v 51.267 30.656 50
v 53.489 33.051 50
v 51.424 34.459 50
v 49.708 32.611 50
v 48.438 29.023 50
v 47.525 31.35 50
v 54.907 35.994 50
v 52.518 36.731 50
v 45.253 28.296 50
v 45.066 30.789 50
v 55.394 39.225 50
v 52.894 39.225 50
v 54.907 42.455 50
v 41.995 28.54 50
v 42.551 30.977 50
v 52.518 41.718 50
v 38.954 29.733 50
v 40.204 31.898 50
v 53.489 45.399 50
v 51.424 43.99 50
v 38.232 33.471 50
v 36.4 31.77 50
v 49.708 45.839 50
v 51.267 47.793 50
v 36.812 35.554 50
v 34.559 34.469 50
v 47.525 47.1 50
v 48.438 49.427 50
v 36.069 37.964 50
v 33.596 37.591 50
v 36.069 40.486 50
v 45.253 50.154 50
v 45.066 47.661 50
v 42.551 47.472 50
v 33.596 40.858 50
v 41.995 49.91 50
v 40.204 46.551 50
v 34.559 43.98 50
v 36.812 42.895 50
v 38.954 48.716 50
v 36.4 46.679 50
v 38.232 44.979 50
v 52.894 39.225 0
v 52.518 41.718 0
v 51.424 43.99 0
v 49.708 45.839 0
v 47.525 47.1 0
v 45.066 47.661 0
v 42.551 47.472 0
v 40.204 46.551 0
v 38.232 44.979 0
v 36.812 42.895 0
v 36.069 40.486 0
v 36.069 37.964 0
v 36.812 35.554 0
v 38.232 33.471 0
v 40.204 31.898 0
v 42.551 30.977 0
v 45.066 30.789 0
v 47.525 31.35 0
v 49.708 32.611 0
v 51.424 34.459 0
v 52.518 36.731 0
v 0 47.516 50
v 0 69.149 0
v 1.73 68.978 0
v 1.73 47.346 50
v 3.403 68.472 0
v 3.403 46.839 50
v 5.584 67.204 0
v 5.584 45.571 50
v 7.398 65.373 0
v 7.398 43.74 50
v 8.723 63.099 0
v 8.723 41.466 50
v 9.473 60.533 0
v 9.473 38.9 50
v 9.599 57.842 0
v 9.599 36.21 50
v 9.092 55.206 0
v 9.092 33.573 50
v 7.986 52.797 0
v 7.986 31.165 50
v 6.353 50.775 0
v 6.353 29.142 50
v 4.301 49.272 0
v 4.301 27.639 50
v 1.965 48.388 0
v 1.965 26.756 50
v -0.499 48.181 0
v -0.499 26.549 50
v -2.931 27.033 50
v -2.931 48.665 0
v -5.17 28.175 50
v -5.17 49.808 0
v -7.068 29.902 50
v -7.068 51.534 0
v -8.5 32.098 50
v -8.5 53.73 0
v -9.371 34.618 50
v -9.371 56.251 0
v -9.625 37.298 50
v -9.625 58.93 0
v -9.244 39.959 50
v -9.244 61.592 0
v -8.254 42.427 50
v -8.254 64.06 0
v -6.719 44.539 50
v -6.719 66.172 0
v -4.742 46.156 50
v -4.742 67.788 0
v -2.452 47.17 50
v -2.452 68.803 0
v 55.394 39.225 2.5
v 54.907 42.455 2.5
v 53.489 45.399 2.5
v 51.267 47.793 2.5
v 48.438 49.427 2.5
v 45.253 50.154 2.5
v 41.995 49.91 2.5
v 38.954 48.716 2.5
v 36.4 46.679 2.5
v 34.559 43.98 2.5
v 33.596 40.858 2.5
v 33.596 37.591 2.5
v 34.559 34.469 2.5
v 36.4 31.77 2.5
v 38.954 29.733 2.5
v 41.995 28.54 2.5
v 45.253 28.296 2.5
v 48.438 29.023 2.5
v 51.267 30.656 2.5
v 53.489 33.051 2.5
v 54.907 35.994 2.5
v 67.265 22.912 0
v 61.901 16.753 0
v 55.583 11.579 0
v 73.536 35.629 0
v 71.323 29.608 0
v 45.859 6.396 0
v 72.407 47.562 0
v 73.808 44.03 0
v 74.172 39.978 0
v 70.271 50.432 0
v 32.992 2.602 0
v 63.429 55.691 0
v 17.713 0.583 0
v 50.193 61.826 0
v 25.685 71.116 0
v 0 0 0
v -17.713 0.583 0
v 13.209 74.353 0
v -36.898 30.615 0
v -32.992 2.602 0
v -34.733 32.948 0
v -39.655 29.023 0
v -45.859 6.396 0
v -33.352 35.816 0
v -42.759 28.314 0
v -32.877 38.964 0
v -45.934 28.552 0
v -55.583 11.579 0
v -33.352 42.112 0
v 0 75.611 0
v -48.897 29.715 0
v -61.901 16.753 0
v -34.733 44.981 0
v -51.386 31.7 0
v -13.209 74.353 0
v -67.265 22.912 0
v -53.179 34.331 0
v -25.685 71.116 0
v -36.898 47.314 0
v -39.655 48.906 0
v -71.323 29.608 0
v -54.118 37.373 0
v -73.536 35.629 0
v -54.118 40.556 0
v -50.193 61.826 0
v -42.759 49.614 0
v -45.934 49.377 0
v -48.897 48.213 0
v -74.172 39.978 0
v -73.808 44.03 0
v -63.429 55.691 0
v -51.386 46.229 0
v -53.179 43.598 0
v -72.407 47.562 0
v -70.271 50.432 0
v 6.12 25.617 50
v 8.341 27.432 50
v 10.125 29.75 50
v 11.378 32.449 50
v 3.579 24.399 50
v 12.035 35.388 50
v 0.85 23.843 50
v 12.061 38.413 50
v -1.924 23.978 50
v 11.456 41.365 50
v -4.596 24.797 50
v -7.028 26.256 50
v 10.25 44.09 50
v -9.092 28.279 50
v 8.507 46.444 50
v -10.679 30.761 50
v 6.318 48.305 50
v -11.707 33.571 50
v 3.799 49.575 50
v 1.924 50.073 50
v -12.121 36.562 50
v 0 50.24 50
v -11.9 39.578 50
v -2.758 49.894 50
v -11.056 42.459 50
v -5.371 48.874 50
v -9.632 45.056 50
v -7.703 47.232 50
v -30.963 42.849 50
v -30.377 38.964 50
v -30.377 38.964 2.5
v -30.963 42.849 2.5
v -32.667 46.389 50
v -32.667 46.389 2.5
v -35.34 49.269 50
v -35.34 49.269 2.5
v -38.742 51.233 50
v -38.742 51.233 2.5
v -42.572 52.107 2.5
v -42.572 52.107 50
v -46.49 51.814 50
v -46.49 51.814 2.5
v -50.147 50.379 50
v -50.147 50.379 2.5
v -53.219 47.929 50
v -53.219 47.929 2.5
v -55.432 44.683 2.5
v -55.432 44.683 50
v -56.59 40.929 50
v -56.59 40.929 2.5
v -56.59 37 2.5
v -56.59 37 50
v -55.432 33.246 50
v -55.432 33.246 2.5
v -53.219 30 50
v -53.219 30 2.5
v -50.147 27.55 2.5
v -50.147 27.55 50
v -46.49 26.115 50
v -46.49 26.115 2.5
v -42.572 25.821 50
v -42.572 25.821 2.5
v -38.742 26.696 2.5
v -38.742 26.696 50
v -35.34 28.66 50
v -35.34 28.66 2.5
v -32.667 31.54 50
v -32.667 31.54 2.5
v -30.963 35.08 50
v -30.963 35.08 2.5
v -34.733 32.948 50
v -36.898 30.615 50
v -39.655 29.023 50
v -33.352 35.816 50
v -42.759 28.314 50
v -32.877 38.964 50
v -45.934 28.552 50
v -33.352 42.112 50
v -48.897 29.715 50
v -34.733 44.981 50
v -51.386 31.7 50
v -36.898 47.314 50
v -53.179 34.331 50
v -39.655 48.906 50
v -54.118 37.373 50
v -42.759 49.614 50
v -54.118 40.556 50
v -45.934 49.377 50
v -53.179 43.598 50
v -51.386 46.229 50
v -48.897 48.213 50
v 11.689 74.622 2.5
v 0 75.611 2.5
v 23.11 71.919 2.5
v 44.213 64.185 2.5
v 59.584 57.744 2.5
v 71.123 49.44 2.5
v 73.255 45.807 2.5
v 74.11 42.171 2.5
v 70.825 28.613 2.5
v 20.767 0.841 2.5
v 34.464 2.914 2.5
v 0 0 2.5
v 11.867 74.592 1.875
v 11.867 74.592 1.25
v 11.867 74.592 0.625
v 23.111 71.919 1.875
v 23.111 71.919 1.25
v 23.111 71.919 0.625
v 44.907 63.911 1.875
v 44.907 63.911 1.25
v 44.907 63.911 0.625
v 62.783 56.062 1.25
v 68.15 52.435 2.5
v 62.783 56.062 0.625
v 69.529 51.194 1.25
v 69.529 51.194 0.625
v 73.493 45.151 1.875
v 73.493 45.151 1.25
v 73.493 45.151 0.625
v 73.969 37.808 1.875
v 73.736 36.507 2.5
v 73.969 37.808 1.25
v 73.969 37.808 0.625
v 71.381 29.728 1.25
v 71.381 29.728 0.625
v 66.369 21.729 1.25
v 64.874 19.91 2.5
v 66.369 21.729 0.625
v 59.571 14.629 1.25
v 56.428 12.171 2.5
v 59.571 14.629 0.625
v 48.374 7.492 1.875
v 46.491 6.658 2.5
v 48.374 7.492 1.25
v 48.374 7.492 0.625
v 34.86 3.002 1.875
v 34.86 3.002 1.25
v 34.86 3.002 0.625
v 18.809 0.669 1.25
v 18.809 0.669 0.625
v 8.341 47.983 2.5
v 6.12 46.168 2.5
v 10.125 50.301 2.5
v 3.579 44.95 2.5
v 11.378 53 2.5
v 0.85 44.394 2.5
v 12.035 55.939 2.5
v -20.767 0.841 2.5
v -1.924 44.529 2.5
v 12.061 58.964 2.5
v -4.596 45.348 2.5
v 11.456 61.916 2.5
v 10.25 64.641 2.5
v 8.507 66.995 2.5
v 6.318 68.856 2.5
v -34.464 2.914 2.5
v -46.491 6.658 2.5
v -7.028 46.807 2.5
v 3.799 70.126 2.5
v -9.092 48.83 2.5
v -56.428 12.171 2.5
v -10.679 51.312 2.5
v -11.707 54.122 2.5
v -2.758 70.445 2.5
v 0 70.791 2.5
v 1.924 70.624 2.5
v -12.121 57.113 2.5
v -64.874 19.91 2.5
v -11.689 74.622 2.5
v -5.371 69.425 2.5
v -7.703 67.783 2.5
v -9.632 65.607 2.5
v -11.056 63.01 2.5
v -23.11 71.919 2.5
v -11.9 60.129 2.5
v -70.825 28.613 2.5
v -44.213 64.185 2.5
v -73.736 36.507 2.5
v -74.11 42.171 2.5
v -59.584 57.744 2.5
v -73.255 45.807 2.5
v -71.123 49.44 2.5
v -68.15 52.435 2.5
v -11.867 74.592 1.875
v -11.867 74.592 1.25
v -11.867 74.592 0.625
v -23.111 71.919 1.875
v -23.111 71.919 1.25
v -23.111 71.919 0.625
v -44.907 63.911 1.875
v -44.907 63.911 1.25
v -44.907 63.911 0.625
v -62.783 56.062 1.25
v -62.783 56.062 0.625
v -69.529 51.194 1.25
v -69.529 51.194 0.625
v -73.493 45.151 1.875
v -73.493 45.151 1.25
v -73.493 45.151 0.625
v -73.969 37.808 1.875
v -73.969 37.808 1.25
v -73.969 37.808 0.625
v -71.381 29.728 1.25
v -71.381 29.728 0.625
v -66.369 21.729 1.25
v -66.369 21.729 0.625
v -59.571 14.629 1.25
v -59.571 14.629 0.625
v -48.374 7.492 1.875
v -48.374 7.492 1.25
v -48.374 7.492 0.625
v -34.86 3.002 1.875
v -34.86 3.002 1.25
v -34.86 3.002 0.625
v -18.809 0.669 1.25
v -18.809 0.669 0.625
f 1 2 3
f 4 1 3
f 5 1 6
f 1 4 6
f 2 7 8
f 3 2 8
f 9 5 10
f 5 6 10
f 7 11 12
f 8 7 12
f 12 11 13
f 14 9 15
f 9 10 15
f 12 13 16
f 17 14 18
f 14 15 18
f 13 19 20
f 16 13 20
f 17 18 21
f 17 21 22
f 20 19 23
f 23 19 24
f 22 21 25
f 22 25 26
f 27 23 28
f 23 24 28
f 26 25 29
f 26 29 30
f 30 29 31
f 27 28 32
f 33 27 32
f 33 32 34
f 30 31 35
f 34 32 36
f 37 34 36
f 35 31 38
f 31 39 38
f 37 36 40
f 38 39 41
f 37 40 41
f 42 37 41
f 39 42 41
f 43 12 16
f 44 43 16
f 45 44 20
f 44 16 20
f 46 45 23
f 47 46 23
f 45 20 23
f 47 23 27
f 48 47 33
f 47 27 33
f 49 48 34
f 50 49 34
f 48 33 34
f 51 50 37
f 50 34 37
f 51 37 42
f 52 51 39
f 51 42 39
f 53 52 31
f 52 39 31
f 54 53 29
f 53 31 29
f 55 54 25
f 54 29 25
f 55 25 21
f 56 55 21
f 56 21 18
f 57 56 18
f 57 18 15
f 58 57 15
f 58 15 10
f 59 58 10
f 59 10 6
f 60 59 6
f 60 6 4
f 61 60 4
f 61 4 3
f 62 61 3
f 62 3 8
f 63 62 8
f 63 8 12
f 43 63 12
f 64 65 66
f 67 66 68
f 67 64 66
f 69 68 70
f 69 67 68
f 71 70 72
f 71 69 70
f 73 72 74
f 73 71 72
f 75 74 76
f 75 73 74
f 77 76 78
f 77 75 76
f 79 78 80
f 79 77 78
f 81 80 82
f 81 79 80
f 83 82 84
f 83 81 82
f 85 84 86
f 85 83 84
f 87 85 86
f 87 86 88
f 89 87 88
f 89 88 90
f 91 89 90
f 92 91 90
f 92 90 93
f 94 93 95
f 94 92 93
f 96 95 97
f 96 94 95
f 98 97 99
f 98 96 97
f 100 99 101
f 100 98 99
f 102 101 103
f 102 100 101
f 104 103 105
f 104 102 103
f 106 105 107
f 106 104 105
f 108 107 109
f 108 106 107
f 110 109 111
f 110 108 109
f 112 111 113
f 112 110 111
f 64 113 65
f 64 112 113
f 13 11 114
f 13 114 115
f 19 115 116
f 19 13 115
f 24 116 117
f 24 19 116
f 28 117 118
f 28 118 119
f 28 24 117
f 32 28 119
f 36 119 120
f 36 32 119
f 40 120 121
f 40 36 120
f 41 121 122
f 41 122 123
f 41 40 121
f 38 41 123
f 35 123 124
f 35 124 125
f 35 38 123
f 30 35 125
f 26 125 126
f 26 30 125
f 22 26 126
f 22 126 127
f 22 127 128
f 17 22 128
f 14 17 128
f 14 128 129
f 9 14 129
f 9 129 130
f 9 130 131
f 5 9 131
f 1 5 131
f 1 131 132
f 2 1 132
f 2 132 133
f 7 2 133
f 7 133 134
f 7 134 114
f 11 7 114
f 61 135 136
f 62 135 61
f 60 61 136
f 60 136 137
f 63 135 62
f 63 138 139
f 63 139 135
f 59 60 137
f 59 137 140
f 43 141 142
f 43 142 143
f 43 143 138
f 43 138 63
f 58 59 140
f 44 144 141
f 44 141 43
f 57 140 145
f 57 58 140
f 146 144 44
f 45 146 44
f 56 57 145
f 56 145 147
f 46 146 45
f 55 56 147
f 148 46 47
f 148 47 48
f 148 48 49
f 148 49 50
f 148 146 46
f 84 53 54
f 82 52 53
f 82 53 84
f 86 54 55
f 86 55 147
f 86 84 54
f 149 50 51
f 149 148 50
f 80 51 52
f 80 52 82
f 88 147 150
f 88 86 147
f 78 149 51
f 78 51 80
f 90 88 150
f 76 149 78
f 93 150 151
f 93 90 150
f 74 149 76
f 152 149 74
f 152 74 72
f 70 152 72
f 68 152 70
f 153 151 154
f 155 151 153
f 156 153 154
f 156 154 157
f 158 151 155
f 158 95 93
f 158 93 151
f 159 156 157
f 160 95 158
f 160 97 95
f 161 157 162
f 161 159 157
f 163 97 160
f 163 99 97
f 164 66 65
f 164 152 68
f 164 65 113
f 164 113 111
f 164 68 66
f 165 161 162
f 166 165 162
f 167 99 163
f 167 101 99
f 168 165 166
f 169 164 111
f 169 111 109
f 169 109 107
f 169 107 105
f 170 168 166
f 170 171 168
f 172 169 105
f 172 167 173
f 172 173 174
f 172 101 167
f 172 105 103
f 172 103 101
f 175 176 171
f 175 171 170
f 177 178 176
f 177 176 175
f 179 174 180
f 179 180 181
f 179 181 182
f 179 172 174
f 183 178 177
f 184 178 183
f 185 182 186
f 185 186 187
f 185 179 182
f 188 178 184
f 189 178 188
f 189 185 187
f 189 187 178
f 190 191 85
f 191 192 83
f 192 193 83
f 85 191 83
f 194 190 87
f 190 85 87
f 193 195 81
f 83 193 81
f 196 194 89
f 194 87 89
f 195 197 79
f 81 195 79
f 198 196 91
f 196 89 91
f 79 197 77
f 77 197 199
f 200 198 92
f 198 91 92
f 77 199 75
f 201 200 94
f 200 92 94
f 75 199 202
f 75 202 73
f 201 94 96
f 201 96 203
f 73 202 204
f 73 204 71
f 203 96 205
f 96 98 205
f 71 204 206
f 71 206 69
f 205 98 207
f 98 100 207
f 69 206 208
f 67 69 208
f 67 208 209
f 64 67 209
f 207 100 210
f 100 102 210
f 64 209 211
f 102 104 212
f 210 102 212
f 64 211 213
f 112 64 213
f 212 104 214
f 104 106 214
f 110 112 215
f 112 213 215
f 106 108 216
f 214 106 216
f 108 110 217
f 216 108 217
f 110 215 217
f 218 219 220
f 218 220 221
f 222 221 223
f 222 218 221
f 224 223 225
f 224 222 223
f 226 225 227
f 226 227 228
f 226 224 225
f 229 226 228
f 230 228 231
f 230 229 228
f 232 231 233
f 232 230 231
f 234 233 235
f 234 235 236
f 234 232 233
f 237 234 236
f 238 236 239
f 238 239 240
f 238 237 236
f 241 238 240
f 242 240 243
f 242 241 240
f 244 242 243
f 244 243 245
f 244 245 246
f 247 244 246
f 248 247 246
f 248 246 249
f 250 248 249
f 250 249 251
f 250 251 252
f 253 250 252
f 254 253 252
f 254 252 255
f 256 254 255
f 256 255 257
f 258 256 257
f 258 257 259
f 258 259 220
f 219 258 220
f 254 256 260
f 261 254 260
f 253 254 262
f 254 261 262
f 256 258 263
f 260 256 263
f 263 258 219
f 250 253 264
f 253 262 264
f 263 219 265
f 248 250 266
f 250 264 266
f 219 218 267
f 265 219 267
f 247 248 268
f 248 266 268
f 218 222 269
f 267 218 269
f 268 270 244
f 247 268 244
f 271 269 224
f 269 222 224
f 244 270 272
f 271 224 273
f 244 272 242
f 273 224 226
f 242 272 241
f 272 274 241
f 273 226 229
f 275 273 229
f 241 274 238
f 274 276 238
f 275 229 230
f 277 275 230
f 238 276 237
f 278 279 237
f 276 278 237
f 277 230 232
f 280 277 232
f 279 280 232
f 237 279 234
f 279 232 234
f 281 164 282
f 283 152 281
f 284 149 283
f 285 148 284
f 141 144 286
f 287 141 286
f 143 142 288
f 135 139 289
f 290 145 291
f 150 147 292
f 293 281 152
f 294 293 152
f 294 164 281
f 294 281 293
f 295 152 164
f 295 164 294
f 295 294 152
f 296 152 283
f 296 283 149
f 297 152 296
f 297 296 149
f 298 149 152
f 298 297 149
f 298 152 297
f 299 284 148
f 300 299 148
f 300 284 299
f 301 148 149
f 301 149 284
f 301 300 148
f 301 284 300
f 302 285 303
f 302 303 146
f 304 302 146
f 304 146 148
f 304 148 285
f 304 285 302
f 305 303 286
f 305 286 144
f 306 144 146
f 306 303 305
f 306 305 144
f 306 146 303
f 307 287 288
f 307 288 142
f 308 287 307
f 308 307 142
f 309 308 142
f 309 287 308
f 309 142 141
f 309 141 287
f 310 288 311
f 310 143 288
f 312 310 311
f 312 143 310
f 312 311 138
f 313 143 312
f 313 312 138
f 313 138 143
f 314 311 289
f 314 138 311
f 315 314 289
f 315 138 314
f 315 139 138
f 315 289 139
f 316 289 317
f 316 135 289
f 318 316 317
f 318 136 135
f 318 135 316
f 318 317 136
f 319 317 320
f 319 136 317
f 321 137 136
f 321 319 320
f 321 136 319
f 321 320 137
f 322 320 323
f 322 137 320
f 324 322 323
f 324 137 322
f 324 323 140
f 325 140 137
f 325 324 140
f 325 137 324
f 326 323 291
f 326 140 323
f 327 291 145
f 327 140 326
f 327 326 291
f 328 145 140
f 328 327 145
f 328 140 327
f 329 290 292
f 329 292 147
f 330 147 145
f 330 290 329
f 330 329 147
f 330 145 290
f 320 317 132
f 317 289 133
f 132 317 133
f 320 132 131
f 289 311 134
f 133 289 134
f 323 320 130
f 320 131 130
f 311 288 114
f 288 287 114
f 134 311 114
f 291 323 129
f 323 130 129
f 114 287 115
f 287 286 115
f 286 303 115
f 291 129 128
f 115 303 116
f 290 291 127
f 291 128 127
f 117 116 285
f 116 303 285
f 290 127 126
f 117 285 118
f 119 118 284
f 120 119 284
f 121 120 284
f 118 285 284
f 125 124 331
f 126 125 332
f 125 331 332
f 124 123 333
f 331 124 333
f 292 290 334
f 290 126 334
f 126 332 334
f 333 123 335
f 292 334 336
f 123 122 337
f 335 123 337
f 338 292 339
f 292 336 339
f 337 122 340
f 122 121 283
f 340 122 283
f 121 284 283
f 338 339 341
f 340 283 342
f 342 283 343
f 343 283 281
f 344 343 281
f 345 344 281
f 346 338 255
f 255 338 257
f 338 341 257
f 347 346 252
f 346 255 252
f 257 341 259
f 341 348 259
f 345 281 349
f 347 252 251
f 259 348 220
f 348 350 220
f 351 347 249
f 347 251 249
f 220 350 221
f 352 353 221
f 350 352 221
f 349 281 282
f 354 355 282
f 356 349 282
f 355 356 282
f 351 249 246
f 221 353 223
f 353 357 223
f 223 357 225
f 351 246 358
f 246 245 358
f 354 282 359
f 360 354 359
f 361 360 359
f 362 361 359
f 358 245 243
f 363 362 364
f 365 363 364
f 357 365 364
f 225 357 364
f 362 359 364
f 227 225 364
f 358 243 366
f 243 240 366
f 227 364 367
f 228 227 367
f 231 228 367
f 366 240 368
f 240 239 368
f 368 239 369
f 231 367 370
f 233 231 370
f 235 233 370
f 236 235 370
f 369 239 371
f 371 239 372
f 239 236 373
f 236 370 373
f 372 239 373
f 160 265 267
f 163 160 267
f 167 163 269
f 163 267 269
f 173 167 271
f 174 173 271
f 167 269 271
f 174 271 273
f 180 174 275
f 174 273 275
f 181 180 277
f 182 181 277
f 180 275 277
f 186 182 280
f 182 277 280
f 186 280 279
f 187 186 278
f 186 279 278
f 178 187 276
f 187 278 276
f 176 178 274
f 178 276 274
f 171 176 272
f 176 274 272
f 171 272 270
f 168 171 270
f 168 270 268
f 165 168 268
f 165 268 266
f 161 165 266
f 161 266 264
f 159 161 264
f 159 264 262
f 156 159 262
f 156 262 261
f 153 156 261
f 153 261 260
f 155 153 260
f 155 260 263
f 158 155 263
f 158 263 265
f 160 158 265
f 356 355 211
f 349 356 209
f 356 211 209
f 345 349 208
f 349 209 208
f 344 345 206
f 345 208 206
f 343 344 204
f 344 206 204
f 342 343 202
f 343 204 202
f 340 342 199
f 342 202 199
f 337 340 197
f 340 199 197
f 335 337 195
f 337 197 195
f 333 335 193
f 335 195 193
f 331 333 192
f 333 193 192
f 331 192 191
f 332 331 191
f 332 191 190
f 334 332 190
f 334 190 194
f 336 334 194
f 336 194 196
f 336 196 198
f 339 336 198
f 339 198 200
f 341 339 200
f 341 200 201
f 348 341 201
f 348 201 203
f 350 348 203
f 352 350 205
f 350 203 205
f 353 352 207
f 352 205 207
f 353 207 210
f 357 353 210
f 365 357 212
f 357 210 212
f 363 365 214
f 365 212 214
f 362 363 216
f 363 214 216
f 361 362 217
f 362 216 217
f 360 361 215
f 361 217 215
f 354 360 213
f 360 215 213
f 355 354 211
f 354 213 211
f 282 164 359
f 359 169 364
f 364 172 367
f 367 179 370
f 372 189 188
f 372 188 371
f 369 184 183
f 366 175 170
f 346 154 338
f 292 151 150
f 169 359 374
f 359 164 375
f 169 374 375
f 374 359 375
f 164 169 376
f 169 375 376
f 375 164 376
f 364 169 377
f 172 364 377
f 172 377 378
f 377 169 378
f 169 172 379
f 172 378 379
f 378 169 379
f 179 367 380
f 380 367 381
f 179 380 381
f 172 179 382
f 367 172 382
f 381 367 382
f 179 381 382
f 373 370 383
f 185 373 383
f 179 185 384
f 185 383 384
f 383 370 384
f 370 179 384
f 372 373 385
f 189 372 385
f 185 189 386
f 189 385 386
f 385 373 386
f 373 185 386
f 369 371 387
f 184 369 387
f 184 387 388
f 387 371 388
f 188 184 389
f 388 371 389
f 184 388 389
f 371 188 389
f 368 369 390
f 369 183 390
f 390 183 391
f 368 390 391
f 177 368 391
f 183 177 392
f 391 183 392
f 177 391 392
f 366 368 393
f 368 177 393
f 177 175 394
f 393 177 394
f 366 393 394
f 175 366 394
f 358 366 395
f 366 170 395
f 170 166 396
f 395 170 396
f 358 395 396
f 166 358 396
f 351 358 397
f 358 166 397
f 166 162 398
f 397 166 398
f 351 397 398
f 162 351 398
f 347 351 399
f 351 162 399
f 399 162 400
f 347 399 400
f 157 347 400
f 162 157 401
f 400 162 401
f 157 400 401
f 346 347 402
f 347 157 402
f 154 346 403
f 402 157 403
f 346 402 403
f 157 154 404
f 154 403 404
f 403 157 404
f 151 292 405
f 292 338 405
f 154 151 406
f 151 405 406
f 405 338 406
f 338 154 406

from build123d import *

# Parameters (mm, degrees)
F1_DEPTH = 50
F5_R     = 10.6799017819
F5_R_2   = 8.4597431053
F6_DEPTH = 50.0010001
F7_T     = -2.5


with BuildPart() as f1:
    # F0 (on Top) → F1 (new body)
    with BuildSketch(Plane.XY):
        with BuildLine():
            Line((0, 75.6106601152), (0, 0))
            add(Edge.make_bspline(
                [(0, 75.6106601152), (16.3684235605, 75.6106601152), (42.2453839997, 64.5620147418), (83.4319100444, 49.4208571166), (60.1946377215, 5.4448728706), (27.0147223777, 0), (0, 0)],
                knots=[0, 0, 0, 0, 0.2591806098, 0.4816524133, 0.7020171791, 1, 1, 1, 1], degree=3))
        make_face()
    extrude(amount=F1_DEPTH)

    # F2: F1 across face


with BuildPart() as f1_1:
    add(f1.part)
    add(f1.part.mirror(Plane(origin=(0, 37.8053300576, 25), x_dir=(0, -1, 0), z_dir=(-1, 0, 0))))

    # F3 (on Right) → F4 (revolve, cut)
    with BuildSketch(Plane.YZ):
        Polygon((41.0470664501, 64.9524852633), (30.8941714466, 64.1714856029), (62.5741977341, -9.0512155762), (71.4108697022, -5.2280023413), align=None)
    revolve(axis=Axis((0, 46.7341845904, 27.5601350133), (0, 0.3970817383, -0.9177832495)), mode=Mode.SUBTRACT)

    # F5 (on face) → F6 (cut, through all)
    with BuildSketch(Plane.XY.offset(50)):
        with Locations((-43.5571484268, 38.964420557)):
            Circle(F5_R)
        with Locations((44.4338209927, 39.2247512937)):
            Circle(F5_R_2)
    extrude(amount=-F6_DEPTH, mode=Mode.SUBTRACT)

    # F7
    f7_openings = [f1_1.faces().sort_by_distance(p)[0] for p in [
        (72.237175, 37.530472, 50),
        (-74.030858, 42.838058, 25),
        (74.030858, 42.838058, 25),
    ]]
    offset(amount=F7_T, openings=f7_openings, kind=Kind.INTERSECTION)


solid = f1_1.part
